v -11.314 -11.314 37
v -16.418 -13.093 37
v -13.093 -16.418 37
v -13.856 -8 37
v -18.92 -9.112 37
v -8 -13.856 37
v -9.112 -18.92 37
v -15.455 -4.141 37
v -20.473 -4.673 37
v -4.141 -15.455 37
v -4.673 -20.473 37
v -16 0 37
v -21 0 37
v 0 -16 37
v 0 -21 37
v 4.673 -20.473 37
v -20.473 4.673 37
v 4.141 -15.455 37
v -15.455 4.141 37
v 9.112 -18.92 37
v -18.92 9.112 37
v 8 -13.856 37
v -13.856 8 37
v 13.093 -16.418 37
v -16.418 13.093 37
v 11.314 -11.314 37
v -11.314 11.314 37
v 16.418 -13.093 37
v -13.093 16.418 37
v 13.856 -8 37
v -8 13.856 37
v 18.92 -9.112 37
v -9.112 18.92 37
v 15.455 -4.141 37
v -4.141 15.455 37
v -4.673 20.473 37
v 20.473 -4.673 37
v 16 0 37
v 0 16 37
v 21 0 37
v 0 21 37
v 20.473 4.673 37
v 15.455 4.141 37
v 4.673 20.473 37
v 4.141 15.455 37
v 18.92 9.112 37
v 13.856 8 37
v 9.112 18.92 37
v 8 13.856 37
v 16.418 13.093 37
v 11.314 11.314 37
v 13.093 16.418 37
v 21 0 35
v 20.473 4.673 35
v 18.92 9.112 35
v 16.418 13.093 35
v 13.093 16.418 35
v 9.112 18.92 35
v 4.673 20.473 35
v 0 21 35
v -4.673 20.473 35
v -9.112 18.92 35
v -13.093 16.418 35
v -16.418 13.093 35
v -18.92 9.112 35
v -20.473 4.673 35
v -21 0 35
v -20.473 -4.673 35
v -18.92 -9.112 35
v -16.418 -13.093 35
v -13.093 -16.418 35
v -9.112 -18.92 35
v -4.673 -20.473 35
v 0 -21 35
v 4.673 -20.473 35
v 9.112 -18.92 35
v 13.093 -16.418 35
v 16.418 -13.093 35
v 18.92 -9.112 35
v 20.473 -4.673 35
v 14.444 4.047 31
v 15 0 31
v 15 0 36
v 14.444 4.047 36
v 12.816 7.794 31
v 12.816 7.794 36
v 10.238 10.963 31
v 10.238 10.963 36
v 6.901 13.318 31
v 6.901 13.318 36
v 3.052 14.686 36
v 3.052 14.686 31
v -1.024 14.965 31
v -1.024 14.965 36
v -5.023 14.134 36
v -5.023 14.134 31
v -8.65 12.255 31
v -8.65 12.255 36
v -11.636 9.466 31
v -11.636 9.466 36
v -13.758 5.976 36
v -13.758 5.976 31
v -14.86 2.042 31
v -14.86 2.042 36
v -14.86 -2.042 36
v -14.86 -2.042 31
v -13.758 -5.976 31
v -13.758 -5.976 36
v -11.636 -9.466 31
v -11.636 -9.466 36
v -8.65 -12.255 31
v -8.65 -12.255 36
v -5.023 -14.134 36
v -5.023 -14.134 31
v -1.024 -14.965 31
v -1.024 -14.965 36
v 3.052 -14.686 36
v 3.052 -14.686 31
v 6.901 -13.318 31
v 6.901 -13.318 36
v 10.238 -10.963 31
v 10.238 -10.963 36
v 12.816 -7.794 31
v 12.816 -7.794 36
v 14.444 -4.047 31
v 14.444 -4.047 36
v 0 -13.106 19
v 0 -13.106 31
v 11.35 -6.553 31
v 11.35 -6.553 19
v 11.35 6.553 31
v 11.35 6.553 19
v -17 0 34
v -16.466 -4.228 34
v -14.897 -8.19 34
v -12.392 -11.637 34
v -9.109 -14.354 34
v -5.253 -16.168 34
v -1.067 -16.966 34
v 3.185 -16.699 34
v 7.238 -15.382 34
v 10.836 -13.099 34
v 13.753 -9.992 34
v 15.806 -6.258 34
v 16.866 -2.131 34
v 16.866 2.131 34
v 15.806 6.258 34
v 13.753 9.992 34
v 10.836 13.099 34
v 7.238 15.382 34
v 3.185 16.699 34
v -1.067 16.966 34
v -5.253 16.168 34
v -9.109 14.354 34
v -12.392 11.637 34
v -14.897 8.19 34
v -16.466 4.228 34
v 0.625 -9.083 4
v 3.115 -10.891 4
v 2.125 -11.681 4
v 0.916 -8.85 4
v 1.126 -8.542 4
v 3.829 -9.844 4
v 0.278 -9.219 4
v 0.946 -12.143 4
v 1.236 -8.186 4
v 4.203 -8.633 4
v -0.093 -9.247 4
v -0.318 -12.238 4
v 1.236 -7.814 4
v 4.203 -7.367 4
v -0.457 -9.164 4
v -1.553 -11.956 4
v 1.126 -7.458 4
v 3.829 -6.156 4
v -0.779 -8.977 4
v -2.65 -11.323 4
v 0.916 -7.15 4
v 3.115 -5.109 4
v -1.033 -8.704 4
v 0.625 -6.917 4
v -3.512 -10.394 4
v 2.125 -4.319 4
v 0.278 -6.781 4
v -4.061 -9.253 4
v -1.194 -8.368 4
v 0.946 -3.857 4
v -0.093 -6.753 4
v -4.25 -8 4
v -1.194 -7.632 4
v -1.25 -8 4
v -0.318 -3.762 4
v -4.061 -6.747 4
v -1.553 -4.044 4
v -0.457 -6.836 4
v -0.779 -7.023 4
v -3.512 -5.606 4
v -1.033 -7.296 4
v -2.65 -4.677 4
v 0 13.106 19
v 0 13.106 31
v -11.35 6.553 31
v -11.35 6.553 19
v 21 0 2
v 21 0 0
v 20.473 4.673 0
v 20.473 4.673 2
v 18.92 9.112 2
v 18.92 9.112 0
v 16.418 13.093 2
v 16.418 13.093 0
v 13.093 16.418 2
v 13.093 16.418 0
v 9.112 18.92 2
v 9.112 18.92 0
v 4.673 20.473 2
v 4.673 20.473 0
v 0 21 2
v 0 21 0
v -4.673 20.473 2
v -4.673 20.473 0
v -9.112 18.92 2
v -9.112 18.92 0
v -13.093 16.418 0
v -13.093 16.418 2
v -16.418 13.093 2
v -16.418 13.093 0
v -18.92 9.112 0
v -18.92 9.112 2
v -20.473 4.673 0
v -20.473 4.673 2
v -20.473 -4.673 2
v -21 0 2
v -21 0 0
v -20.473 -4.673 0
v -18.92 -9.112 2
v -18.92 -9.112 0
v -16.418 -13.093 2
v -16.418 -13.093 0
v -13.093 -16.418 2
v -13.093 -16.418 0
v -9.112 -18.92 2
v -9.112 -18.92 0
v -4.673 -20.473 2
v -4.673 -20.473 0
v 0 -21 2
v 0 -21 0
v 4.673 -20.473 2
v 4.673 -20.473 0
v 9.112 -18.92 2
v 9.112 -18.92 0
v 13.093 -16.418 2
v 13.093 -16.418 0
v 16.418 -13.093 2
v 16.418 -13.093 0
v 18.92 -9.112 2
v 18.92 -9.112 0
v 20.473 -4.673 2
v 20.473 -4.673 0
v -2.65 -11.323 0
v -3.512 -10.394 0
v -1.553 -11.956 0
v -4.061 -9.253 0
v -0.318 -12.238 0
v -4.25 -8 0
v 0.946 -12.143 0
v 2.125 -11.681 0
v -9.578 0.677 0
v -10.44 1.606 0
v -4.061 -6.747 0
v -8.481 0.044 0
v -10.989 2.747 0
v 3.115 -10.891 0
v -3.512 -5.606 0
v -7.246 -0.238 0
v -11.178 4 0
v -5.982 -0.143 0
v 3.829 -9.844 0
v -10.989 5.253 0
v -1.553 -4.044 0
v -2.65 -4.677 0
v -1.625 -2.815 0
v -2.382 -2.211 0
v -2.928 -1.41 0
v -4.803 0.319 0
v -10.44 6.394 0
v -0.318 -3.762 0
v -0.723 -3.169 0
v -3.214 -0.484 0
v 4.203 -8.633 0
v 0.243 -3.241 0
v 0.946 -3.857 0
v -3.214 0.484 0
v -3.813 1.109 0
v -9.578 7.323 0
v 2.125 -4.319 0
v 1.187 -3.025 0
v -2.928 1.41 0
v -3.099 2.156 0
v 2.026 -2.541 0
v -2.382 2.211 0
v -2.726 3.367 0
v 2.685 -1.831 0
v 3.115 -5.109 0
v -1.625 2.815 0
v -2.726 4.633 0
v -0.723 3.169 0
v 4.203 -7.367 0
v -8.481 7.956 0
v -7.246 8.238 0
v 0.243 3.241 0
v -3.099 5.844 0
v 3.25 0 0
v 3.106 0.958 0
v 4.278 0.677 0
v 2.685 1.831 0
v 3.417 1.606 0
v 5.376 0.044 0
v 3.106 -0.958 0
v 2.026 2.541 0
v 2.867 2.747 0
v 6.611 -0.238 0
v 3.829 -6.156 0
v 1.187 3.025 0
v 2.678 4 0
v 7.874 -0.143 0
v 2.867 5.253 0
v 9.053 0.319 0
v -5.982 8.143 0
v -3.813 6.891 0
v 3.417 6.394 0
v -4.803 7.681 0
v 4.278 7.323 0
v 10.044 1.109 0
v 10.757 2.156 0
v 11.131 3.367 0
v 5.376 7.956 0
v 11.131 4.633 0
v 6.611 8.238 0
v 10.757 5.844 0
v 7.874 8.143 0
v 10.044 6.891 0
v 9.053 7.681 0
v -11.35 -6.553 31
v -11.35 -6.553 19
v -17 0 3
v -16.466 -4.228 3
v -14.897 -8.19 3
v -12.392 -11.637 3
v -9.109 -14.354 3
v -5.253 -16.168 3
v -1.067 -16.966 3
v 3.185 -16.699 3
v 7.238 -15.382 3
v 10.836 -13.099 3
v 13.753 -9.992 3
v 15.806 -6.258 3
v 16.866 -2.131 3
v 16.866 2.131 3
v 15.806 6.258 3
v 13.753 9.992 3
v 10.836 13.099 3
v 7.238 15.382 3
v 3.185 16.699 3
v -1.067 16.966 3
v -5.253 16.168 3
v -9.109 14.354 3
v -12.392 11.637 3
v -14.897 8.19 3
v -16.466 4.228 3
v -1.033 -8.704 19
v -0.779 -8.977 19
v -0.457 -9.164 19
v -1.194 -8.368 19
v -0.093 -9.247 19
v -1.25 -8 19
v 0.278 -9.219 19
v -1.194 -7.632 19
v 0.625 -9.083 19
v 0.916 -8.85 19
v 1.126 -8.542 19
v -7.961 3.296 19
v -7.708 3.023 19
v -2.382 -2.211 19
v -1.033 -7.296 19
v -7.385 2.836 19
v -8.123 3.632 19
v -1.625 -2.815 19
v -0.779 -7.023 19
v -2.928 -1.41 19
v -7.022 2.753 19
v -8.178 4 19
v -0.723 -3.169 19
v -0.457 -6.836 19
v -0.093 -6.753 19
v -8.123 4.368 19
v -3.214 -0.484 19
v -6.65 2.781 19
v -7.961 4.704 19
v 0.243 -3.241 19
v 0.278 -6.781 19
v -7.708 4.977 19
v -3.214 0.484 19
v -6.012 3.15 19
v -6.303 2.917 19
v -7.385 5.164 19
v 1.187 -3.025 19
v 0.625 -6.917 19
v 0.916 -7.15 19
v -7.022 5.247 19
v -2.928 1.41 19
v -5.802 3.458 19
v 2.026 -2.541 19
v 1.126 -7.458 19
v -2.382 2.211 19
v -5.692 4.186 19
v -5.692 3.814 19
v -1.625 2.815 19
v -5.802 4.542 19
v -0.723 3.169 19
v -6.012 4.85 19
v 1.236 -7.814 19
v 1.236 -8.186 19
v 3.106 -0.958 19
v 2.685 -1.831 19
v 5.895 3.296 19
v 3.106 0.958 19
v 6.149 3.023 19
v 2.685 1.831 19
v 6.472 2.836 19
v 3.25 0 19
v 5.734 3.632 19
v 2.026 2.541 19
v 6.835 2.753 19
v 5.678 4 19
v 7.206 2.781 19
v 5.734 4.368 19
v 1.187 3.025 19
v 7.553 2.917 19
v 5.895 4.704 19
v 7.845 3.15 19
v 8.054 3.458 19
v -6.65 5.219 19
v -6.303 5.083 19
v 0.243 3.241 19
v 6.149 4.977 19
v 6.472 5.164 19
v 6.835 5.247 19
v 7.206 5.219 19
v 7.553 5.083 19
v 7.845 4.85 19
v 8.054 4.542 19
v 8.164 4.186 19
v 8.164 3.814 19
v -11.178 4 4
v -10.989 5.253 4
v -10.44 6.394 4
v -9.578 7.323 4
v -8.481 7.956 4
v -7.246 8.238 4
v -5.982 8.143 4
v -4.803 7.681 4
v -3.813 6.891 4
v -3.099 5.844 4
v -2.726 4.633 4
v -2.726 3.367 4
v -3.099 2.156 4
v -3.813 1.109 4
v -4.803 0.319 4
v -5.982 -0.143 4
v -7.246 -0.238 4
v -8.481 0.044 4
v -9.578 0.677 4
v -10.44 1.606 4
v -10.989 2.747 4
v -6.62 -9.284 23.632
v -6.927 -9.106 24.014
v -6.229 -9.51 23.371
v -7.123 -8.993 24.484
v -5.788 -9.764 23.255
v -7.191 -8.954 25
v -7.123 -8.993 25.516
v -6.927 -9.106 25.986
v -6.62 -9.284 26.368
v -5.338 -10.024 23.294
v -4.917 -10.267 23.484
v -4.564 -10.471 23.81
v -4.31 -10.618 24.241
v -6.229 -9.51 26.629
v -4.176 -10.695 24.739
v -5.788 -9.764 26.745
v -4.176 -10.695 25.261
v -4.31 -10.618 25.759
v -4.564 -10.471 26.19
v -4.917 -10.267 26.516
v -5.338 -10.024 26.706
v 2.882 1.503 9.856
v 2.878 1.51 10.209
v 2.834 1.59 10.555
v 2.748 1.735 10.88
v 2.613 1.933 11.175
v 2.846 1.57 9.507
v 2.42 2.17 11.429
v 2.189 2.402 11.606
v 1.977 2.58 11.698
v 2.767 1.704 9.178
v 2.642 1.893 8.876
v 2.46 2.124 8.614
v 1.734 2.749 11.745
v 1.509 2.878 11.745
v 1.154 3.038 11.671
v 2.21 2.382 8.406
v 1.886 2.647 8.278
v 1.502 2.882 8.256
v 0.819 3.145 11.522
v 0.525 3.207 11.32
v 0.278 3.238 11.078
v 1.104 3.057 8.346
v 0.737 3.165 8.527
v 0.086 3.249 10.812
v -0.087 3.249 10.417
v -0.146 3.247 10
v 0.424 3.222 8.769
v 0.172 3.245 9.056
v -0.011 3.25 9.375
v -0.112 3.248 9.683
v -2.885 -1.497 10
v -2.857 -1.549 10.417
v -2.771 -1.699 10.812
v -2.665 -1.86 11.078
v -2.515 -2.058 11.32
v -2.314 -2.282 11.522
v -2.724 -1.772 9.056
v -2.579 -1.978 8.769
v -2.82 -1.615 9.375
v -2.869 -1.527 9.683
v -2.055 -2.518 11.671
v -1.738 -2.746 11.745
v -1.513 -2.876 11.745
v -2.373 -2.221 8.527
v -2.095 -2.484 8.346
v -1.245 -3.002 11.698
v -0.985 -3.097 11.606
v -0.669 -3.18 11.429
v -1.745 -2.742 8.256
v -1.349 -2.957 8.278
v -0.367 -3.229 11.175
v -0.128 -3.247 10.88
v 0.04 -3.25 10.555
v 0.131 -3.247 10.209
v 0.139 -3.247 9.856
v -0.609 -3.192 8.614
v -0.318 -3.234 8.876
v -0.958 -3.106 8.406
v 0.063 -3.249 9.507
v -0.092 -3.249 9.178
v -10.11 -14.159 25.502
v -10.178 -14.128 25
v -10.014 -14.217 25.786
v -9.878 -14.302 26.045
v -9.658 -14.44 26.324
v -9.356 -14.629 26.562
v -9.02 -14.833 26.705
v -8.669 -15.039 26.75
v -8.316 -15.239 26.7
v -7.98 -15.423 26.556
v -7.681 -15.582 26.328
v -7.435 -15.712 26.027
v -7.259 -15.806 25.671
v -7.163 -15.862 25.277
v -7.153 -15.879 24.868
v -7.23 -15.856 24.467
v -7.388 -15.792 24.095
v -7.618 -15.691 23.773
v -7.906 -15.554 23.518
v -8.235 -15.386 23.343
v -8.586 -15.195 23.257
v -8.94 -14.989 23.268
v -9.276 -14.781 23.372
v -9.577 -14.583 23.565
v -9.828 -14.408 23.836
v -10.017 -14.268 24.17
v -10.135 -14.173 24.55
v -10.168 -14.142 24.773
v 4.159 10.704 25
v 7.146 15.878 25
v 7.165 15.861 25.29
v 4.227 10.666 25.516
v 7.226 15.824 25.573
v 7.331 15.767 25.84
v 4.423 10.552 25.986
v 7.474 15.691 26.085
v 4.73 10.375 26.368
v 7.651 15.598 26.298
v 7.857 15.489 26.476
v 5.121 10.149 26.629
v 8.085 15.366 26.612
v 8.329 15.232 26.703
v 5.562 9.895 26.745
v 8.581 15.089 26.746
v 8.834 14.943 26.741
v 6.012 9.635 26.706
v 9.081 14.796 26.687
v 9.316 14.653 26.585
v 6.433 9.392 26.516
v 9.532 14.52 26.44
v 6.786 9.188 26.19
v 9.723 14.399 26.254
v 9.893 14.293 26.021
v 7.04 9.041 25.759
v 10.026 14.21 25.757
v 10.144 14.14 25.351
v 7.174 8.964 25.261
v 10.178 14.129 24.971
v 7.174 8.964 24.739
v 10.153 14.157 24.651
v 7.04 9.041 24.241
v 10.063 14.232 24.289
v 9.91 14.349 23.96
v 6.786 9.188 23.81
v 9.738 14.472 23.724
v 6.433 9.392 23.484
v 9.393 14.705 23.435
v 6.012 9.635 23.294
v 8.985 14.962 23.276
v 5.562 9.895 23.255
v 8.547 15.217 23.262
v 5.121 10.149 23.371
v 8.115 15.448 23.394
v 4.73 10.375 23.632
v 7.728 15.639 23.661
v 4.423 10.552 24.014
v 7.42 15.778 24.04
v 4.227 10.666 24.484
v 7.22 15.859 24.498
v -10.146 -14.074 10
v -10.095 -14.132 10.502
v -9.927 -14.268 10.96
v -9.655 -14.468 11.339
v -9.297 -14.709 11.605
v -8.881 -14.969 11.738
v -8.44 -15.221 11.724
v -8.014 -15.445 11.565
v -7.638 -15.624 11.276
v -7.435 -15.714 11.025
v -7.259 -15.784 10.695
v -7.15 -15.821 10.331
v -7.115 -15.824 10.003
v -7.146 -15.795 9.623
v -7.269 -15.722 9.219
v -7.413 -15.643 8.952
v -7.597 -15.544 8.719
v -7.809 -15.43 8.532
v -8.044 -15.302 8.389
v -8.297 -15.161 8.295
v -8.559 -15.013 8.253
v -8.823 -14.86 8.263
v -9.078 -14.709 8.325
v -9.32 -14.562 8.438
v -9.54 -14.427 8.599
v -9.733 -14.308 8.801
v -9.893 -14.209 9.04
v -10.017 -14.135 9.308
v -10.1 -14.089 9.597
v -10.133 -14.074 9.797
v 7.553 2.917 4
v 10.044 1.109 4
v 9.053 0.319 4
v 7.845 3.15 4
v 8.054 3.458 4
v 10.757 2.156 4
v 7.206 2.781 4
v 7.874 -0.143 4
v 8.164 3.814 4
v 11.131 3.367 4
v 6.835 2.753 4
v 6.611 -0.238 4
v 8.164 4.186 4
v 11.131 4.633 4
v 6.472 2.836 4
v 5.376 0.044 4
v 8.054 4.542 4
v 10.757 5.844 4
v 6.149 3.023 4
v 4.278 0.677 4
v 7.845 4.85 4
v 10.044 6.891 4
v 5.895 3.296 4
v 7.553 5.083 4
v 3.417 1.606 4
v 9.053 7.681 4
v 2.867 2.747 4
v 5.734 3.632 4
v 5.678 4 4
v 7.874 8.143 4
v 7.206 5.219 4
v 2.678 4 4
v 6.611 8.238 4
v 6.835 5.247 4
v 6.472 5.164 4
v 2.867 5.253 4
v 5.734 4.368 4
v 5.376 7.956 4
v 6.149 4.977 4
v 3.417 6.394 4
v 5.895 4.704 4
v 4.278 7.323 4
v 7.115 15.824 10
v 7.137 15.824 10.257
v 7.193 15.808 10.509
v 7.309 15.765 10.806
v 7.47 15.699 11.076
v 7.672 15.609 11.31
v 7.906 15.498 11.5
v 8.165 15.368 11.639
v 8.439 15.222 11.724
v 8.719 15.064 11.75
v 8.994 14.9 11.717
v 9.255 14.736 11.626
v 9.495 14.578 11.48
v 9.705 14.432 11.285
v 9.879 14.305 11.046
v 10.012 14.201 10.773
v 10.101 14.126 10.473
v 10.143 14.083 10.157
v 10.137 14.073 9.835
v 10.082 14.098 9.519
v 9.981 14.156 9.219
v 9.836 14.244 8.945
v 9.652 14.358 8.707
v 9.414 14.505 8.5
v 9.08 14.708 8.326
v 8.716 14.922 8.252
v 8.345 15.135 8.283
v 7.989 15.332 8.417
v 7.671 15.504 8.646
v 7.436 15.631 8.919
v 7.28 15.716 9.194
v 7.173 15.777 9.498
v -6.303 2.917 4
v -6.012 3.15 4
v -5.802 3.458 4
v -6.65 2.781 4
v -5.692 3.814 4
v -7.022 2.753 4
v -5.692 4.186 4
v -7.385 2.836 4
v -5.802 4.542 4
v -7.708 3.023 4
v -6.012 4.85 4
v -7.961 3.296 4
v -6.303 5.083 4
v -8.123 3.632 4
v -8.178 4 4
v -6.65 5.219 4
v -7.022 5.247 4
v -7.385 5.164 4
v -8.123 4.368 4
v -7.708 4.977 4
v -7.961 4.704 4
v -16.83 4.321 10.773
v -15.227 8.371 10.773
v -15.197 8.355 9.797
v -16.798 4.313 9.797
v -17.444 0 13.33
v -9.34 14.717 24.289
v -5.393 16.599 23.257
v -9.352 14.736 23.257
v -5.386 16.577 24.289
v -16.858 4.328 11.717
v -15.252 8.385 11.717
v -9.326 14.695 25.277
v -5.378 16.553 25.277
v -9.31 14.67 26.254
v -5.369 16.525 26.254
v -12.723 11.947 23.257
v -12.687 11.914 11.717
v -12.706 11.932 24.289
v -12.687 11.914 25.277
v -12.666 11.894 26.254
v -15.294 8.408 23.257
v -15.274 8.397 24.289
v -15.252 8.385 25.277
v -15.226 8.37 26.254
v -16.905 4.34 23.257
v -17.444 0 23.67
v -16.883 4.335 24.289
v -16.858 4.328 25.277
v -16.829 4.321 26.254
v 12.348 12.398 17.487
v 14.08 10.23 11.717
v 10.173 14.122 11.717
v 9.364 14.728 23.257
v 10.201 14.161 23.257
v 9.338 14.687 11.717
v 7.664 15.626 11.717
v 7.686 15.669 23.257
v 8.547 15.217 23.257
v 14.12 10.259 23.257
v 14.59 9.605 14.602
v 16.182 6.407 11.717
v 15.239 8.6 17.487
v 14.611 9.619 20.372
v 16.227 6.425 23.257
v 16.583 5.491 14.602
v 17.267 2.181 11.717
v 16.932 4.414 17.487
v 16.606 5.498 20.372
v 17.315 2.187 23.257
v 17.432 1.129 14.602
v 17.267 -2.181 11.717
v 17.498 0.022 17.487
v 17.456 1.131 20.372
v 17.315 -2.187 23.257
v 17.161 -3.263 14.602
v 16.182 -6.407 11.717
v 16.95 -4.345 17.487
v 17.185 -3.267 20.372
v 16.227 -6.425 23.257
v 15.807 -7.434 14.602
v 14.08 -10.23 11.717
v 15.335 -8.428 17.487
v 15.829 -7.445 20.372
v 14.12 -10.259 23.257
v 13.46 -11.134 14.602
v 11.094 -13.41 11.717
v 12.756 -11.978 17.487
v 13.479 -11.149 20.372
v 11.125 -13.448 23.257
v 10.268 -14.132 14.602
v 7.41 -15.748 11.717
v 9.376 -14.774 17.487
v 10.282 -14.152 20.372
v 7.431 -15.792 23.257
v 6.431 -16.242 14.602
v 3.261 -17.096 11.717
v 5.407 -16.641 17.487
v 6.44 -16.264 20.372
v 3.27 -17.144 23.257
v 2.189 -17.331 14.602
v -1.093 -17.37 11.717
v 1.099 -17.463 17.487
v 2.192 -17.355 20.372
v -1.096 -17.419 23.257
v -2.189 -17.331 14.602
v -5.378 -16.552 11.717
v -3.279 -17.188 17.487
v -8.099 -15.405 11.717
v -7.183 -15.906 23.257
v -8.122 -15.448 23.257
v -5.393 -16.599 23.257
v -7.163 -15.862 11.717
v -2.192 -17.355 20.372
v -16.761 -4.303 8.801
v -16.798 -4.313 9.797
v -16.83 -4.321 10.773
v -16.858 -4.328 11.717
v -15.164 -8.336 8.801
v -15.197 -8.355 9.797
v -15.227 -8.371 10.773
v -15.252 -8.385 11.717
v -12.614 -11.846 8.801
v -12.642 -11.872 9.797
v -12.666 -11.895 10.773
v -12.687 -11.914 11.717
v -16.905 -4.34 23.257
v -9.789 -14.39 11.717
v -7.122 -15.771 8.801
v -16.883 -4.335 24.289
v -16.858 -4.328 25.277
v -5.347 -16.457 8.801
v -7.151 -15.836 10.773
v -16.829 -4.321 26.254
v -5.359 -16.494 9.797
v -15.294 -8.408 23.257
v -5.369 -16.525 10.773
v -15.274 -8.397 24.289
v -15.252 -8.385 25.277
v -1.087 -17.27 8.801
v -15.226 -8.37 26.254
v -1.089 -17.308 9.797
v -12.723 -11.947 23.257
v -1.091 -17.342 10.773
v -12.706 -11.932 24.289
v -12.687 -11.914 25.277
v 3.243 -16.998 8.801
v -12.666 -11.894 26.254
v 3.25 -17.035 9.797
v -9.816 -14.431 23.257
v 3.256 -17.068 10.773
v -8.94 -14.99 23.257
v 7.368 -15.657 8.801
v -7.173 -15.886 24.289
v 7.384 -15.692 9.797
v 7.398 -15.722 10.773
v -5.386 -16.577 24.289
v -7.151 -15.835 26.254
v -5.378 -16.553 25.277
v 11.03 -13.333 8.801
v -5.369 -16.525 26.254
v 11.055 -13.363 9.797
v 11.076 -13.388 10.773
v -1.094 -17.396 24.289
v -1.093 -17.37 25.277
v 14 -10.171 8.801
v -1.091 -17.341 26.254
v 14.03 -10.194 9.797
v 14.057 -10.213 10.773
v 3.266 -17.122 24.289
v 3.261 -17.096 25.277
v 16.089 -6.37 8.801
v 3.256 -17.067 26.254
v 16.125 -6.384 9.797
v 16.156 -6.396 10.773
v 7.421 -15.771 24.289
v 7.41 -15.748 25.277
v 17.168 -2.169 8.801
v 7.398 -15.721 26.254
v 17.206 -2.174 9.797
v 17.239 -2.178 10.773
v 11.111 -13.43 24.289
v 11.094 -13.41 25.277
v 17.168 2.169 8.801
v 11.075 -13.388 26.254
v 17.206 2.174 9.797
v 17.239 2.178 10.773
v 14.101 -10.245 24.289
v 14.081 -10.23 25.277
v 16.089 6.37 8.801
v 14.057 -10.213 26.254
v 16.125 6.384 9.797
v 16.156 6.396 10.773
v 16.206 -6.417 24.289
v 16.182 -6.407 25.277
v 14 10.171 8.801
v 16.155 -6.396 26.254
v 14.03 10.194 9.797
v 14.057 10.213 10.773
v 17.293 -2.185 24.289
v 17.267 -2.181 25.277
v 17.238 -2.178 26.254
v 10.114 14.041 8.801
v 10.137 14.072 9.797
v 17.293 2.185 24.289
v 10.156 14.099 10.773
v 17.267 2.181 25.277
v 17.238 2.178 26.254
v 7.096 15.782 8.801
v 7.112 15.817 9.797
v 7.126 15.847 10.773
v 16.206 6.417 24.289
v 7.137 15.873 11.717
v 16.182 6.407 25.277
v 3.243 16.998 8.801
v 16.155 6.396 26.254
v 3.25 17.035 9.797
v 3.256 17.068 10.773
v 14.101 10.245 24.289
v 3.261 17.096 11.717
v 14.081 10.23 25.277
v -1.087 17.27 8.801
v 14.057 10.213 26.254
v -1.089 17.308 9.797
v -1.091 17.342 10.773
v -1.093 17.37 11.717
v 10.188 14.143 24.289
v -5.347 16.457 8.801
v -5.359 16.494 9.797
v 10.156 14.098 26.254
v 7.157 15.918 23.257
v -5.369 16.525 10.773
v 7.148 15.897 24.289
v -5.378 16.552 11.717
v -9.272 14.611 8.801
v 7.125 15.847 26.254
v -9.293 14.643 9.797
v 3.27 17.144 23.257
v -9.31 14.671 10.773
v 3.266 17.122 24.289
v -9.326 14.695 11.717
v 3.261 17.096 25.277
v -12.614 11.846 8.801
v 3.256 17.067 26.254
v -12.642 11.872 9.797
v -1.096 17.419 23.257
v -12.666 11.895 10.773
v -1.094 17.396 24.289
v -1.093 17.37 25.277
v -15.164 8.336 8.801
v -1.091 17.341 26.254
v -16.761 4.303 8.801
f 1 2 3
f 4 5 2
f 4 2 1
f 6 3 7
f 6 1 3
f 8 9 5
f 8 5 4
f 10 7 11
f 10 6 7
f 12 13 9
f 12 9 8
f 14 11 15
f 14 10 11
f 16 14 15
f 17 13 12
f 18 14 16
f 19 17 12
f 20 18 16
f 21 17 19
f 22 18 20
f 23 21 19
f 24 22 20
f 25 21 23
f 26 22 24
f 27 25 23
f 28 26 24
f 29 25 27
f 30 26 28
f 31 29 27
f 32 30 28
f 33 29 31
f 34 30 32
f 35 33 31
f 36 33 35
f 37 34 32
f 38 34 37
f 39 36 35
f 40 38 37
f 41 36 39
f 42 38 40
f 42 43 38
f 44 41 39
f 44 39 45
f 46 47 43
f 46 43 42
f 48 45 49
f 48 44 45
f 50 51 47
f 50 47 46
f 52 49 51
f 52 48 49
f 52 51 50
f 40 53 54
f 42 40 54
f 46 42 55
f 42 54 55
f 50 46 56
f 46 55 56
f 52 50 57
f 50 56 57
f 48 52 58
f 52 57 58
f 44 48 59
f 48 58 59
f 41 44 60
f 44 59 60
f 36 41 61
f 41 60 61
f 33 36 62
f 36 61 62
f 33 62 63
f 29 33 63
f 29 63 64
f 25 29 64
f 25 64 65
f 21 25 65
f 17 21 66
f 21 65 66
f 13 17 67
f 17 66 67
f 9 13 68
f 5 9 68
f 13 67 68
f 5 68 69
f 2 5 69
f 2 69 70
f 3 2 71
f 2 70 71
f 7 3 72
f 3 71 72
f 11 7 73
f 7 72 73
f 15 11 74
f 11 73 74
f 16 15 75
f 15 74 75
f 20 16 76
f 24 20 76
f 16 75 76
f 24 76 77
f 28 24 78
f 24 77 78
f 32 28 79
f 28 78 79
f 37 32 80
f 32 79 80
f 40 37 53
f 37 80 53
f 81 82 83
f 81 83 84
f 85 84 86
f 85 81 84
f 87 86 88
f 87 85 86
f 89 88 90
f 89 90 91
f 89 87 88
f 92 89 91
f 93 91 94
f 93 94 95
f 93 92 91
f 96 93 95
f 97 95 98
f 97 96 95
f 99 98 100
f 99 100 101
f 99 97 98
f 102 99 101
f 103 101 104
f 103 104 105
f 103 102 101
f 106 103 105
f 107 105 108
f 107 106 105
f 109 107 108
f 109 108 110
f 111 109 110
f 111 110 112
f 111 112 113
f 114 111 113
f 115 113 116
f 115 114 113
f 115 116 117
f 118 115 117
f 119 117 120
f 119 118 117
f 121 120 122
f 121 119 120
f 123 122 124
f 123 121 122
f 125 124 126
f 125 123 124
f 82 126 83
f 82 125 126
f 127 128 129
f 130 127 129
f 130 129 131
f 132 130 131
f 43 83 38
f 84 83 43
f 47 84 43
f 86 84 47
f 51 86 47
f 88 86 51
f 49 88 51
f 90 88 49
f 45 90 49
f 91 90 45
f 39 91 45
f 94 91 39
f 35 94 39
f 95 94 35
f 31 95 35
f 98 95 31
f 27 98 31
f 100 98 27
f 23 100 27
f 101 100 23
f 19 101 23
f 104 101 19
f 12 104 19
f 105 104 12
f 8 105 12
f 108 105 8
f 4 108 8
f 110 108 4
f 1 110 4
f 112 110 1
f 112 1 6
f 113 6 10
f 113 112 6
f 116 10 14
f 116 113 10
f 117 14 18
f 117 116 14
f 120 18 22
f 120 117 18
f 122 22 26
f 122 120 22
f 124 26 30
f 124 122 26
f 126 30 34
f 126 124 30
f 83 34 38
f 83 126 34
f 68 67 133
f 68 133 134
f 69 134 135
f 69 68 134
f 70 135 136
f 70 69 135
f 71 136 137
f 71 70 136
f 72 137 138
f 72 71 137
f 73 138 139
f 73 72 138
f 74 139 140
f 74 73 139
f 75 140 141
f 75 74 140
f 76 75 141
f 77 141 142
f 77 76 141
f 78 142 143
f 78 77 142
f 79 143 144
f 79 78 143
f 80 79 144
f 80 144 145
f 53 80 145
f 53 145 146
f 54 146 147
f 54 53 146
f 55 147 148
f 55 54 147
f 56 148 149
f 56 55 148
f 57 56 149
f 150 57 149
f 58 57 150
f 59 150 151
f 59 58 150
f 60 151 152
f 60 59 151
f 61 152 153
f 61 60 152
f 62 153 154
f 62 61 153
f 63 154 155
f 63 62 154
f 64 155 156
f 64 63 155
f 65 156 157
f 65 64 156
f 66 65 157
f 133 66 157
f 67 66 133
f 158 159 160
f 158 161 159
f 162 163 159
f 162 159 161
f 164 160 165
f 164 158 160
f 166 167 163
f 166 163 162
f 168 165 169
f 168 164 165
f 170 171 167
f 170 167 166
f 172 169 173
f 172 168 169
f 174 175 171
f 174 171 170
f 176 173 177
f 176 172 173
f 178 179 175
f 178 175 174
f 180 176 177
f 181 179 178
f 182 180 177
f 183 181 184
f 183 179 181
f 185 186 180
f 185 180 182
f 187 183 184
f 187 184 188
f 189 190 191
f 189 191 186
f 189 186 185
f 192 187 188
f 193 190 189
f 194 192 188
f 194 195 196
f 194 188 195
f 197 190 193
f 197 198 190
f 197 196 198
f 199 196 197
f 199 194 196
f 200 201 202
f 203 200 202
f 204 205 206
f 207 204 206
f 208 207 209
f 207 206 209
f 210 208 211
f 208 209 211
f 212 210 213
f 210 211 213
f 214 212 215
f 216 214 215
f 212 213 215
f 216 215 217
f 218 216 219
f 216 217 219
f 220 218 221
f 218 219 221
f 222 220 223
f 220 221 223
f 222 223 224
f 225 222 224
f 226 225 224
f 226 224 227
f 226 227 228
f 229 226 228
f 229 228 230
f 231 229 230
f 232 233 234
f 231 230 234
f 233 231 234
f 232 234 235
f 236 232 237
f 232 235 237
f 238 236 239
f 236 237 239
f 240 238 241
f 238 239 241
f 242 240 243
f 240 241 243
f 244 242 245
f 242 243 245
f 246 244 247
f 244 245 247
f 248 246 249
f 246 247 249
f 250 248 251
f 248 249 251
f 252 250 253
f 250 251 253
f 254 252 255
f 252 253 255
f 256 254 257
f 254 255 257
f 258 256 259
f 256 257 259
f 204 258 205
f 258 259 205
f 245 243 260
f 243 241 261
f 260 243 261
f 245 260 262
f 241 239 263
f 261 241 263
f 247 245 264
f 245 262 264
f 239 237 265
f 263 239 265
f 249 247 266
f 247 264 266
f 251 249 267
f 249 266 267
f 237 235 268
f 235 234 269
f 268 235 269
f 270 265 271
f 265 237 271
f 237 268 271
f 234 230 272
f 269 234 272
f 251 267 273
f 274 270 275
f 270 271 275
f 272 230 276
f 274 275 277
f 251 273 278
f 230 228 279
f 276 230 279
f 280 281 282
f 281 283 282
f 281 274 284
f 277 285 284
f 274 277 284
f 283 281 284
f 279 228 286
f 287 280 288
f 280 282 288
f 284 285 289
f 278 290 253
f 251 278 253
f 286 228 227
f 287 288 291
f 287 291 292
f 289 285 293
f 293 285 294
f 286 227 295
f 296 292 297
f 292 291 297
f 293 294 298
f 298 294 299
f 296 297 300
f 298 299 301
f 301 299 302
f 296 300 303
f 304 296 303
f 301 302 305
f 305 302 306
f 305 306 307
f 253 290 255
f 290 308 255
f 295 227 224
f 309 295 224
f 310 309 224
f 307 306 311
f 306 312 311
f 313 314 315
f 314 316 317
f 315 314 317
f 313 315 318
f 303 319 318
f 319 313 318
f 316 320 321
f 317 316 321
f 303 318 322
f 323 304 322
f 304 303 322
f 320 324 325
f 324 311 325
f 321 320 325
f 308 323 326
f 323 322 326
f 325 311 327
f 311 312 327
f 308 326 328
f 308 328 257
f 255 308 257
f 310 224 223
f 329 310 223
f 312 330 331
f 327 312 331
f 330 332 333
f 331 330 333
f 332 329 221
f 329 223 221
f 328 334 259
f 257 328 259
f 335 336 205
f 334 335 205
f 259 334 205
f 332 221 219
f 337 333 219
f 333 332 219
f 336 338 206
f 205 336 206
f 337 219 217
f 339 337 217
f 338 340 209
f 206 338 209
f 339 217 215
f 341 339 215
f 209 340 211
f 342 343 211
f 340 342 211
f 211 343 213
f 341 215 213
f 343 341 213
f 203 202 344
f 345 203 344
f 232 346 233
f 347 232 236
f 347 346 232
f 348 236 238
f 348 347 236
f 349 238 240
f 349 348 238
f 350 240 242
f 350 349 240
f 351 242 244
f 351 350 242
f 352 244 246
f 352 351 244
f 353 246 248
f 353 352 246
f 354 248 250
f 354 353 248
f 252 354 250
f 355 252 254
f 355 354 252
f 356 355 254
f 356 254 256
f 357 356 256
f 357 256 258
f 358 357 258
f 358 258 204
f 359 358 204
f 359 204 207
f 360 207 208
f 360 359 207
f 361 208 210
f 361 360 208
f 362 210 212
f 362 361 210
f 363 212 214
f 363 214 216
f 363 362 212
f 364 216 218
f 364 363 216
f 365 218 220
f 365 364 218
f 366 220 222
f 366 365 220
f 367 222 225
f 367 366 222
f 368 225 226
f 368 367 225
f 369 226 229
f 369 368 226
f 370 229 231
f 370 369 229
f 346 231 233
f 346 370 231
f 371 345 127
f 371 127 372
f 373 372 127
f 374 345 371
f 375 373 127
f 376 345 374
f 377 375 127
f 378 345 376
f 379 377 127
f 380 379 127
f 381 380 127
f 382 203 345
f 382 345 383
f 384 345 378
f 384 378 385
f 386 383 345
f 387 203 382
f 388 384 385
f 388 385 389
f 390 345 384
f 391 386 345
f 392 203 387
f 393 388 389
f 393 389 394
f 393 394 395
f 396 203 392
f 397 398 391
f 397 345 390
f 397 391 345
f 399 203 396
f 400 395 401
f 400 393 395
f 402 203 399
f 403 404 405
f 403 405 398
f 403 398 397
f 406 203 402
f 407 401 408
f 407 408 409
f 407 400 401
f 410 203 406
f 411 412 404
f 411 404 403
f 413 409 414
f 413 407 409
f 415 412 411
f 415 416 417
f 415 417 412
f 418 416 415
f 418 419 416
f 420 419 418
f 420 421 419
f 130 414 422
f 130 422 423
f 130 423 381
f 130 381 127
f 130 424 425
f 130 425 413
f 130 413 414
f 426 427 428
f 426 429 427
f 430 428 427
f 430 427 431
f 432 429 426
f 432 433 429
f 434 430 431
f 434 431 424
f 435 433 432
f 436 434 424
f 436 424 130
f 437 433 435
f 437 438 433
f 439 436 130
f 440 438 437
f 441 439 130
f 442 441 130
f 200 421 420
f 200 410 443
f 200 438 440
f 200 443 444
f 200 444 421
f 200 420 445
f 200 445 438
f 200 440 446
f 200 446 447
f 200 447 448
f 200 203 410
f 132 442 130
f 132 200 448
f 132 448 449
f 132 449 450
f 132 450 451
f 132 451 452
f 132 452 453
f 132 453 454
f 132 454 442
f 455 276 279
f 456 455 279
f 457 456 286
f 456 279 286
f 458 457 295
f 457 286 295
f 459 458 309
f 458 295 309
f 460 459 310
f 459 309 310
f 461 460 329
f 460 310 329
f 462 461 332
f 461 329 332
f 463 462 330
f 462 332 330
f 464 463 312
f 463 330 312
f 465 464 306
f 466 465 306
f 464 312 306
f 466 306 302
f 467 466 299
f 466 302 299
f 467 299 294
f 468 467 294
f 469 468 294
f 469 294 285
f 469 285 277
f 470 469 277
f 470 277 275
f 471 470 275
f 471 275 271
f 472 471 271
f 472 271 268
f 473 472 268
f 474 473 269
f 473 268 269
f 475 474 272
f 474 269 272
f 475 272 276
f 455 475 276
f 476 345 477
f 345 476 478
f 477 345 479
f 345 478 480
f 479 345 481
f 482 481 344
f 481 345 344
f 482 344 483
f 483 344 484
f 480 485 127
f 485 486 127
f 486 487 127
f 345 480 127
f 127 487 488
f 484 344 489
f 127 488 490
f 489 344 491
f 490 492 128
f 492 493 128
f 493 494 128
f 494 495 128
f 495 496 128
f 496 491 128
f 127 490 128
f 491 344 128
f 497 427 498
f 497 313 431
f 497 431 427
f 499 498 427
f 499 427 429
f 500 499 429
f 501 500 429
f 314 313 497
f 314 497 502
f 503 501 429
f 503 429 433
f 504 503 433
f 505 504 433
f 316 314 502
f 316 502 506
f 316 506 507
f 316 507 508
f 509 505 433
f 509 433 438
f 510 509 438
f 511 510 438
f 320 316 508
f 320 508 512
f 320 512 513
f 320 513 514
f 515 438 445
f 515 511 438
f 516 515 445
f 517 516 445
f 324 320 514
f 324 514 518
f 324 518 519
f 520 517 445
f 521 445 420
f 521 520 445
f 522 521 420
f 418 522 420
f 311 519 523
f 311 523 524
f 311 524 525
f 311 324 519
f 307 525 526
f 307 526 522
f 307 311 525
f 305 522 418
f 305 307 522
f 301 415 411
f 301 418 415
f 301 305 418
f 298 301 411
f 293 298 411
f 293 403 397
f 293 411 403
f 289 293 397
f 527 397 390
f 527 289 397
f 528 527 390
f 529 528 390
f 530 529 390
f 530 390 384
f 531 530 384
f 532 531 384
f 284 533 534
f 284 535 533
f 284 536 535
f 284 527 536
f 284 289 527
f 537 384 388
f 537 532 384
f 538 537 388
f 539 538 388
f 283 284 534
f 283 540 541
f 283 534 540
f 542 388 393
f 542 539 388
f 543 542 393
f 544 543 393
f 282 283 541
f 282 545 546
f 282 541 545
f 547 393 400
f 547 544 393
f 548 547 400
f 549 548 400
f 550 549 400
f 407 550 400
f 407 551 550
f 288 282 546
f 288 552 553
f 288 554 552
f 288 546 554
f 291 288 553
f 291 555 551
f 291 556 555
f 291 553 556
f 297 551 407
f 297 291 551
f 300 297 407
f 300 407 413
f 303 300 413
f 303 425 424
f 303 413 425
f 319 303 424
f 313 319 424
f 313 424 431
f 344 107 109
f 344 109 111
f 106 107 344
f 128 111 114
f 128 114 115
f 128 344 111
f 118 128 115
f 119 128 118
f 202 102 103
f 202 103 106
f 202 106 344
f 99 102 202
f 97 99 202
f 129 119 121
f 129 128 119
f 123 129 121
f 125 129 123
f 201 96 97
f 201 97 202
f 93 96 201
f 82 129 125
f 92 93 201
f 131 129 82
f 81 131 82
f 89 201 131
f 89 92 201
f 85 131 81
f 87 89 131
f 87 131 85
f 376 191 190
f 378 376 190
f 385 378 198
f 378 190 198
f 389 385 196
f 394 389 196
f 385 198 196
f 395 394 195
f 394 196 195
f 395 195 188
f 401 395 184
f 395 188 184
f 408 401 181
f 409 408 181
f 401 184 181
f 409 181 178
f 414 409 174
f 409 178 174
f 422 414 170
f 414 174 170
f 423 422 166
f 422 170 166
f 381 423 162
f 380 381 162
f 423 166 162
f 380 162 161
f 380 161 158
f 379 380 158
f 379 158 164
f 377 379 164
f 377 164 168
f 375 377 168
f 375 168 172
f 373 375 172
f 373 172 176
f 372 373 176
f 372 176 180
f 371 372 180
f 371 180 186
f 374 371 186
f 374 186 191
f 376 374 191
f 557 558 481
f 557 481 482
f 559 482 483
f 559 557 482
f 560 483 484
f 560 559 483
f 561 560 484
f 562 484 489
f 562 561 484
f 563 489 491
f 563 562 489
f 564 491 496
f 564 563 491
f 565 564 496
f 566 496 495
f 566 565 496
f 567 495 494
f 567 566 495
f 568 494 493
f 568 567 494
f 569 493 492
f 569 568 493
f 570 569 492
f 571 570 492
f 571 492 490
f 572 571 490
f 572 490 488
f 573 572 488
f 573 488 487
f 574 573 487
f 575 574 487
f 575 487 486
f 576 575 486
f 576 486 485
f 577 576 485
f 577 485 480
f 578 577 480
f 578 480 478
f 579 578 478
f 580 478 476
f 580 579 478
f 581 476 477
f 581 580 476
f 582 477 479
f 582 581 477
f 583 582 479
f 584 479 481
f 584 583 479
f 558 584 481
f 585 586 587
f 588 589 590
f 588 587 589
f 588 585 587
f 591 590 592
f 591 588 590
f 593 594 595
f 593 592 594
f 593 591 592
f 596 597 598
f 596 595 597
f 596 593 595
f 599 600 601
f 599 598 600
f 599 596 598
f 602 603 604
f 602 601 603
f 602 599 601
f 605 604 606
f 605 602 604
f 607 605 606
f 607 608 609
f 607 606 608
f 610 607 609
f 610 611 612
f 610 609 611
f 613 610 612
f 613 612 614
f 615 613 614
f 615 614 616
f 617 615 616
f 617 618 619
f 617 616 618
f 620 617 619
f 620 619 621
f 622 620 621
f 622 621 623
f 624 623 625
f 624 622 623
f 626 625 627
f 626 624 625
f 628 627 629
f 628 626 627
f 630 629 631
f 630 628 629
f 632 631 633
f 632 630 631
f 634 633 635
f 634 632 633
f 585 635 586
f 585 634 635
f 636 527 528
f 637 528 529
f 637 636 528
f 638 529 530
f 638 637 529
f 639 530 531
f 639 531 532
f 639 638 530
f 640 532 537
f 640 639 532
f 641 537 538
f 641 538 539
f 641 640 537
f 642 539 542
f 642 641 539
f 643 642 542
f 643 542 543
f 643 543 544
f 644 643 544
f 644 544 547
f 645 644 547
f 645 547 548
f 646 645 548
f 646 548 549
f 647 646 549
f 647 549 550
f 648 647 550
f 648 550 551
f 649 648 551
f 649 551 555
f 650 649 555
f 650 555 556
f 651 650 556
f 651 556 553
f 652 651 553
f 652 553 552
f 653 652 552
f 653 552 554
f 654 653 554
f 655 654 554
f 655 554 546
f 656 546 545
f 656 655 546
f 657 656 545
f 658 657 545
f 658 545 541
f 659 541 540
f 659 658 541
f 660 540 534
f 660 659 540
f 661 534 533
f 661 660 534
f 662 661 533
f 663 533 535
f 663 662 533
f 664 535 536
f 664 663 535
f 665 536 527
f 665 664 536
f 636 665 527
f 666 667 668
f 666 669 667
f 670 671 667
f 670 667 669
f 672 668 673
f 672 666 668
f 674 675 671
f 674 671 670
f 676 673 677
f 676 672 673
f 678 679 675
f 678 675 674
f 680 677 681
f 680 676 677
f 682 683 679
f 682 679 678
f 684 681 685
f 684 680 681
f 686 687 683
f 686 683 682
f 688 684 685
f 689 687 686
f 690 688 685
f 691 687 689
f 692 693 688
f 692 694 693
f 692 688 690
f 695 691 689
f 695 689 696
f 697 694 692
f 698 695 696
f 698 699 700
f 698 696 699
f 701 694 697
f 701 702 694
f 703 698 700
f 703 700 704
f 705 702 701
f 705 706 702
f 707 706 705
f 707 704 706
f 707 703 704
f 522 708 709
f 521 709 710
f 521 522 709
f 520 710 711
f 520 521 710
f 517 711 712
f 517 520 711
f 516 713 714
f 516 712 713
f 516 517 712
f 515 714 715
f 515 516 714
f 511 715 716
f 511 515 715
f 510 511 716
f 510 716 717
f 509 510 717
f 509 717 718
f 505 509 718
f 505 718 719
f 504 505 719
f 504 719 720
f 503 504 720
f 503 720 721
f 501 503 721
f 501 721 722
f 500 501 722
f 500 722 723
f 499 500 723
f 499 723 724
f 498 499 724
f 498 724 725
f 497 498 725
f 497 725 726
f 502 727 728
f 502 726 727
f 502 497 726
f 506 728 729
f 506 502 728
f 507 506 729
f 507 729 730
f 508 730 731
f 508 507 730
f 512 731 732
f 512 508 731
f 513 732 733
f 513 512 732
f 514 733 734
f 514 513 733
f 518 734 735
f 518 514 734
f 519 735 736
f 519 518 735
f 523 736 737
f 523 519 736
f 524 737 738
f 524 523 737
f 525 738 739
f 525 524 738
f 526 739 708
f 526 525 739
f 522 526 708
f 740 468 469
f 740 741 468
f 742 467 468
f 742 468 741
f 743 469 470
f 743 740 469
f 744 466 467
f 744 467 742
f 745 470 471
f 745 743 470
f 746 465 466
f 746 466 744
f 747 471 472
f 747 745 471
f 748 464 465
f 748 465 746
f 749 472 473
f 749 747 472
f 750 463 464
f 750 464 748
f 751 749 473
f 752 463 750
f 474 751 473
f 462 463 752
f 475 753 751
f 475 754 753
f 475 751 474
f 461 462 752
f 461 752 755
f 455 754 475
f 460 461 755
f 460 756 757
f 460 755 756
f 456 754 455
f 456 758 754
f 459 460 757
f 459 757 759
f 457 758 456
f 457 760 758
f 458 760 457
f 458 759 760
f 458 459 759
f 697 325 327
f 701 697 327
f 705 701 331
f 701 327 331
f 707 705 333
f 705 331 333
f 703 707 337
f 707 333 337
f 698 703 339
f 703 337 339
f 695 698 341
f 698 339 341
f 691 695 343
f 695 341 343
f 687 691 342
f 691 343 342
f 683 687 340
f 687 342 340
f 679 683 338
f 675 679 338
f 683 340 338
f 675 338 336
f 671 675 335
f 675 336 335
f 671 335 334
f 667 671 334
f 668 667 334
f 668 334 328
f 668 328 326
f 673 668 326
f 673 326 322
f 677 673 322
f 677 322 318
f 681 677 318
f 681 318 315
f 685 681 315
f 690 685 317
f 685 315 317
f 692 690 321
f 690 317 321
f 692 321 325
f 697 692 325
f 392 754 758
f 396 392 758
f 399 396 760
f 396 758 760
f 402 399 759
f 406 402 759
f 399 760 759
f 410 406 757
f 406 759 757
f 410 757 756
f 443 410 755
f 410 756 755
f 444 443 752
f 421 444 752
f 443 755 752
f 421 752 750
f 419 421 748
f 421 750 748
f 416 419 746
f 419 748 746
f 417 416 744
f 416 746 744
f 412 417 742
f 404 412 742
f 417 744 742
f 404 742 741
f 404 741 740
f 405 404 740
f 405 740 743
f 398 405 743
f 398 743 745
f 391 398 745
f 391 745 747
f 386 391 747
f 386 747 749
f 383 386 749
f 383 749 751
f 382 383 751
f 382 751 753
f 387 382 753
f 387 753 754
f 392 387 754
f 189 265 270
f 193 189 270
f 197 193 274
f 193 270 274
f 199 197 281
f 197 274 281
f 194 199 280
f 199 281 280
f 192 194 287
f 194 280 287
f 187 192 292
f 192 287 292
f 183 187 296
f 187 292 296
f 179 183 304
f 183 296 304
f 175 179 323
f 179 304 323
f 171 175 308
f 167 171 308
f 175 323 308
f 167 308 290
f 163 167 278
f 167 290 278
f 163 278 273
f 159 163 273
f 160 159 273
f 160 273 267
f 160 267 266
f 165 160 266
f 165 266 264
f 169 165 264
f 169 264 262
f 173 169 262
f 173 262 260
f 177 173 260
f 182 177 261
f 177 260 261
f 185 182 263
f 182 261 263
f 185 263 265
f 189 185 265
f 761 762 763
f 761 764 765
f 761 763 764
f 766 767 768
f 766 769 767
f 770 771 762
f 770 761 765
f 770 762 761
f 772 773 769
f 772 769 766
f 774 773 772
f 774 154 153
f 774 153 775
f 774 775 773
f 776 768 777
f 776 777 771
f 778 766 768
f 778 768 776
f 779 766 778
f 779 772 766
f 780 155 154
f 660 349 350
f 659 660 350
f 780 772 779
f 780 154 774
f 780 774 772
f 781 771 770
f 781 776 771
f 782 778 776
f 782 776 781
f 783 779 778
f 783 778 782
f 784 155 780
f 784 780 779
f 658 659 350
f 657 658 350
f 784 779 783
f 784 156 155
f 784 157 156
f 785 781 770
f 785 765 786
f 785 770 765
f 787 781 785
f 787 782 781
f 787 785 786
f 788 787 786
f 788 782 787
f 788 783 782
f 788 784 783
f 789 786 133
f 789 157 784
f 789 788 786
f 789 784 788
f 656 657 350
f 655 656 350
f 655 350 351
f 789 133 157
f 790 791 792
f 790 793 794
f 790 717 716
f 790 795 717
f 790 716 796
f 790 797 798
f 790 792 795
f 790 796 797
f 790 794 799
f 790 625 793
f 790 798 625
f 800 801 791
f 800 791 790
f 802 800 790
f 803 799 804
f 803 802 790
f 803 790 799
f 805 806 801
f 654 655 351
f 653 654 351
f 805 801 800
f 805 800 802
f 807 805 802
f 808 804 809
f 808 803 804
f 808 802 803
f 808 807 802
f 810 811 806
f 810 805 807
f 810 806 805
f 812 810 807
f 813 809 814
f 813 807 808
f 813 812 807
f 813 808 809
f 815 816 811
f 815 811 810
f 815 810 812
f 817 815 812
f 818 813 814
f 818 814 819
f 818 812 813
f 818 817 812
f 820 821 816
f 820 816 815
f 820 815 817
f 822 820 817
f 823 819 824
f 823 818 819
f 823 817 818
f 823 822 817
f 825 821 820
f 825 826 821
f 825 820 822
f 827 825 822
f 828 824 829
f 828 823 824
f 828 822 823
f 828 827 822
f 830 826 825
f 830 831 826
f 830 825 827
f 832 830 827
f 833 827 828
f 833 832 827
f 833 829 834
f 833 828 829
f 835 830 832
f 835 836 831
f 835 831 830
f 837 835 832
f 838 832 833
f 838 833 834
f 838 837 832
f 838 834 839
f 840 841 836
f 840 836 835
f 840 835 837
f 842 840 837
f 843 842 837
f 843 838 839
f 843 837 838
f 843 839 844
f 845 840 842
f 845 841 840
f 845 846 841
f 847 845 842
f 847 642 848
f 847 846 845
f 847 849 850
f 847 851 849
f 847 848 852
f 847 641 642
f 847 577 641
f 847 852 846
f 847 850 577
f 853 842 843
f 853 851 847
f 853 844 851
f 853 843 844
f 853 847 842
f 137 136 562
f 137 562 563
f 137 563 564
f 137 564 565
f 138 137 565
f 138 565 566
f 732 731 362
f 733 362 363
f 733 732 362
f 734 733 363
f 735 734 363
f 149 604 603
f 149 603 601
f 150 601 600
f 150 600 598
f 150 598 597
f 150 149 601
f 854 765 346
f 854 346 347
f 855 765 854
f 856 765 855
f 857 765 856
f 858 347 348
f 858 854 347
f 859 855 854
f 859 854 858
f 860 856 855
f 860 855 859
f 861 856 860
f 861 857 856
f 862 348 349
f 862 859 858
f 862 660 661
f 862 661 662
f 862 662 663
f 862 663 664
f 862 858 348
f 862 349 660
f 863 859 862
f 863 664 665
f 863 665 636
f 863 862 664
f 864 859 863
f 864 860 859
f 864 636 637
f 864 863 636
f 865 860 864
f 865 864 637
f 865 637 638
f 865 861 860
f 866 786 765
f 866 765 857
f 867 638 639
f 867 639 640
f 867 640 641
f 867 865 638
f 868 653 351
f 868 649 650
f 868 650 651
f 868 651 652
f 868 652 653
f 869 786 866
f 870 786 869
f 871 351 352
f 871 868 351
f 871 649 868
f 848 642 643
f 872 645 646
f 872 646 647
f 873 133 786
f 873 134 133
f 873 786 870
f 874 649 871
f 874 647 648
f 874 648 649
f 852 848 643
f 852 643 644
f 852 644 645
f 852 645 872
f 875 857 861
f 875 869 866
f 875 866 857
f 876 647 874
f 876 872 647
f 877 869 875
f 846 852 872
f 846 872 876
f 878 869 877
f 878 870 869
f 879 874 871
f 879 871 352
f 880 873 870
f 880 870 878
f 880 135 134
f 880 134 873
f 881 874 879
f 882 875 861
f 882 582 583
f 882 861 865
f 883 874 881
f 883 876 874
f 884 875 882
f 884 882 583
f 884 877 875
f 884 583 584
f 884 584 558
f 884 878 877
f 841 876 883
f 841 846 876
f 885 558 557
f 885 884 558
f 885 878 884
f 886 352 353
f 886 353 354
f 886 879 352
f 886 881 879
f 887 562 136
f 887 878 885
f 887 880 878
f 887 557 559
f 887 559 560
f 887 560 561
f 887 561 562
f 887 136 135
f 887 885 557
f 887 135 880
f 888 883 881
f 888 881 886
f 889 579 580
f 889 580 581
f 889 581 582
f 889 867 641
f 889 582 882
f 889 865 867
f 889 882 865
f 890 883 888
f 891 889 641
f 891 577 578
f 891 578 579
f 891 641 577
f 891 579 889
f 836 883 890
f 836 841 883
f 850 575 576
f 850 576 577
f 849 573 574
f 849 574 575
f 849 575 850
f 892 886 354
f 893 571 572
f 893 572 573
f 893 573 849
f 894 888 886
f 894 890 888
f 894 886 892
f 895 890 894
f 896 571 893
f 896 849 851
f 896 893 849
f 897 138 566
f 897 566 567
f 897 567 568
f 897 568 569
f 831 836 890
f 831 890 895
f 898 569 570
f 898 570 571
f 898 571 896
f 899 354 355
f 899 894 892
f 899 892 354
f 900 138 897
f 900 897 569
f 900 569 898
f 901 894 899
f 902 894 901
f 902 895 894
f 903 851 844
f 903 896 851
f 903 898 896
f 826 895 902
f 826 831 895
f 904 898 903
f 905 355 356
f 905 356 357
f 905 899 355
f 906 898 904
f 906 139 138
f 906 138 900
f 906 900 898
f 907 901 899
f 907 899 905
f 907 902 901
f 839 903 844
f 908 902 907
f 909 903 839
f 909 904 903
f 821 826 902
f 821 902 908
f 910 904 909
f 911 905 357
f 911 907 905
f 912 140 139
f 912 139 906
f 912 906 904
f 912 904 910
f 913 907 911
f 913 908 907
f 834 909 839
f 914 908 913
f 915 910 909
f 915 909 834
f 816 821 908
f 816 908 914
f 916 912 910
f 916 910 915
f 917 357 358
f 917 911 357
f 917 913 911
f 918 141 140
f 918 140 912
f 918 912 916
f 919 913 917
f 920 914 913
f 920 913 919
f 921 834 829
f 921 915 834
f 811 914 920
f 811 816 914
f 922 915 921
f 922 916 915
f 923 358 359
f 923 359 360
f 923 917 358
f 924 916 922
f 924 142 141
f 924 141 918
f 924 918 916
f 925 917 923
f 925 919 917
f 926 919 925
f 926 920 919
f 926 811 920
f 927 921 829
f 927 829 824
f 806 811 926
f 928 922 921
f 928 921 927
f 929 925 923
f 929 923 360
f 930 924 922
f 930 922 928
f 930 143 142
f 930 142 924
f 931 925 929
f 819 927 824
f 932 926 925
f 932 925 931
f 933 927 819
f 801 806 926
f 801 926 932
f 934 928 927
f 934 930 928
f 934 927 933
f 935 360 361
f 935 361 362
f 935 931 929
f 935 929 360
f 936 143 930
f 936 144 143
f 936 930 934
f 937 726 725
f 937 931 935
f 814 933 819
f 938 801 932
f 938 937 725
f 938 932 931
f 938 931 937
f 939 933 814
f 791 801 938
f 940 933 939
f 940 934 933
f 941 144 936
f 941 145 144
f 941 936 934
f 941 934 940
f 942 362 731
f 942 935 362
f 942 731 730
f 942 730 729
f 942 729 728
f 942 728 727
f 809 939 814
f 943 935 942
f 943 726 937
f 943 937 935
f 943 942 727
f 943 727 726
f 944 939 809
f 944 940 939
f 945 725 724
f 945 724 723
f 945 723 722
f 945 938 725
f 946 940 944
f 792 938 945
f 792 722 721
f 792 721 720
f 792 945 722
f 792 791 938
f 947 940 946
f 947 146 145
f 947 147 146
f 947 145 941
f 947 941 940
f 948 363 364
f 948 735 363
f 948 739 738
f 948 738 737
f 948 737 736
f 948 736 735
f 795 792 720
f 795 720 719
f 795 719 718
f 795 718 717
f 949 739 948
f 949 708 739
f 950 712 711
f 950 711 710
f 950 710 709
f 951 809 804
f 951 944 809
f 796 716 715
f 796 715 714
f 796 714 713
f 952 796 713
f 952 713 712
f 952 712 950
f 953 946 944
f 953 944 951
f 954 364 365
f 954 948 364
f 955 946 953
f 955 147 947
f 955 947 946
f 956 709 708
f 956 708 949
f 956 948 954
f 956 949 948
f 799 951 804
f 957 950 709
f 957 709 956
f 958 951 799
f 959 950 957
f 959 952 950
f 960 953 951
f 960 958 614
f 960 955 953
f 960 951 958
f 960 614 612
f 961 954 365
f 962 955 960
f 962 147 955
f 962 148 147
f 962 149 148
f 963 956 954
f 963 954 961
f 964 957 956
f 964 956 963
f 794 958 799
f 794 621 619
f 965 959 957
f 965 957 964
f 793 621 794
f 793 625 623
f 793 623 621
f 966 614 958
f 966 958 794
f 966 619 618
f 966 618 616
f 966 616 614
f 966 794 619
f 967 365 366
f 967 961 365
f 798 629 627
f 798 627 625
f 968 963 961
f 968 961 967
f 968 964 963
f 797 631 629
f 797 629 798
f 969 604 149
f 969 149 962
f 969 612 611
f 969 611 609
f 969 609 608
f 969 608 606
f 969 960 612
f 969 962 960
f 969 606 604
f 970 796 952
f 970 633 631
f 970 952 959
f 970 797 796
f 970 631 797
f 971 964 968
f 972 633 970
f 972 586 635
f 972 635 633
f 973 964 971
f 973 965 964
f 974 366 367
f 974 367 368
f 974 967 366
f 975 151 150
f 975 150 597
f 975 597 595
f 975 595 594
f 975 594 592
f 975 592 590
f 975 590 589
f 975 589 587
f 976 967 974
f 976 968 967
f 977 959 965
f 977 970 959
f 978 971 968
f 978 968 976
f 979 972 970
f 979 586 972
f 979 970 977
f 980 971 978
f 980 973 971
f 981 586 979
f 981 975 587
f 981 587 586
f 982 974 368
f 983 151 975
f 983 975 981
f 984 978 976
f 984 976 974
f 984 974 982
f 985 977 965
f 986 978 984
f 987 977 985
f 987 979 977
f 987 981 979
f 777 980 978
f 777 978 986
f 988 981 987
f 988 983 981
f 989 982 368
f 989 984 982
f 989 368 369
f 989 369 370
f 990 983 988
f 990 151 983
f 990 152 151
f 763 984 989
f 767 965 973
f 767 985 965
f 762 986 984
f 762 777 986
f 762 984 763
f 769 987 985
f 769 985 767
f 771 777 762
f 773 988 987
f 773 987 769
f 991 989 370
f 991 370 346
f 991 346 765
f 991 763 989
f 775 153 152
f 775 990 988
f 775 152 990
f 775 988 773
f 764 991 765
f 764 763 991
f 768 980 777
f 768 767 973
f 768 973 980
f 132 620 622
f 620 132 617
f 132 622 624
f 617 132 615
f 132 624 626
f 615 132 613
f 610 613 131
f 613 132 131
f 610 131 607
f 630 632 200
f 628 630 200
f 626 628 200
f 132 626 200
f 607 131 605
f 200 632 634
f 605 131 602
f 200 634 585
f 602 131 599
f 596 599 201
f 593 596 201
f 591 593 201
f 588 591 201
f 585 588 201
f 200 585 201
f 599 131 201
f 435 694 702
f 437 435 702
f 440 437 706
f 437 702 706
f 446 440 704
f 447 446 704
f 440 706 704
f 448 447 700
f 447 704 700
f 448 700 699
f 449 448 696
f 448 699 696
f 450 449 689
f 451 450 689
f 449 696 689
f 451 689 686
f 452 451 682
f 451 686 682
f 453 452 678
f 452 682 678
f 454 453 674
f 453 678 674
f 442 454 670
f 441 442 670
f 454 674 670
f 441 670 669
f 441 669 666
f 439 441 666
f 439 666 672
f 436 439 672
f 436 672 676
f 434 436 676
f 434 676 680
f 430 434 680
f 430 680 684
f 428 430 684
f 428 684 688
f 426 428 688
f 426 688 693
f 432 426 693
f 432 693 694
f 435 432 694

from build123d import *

# Parameters (mm, degrees)
ESQUISSE1_R                   = 21
ESQUISSE1_R_2                 = 3.25
BOSS_EXTRU_1_DEPTH            = 31
ESQUISSE2_R                   = 21
ESQUISSE2_R_2                 = 15
BOSS_EXTRU_2_DEPTH            = 6
ENL_V_MAT_EXTRU_9_DEPTH       = 12
CHANFREIN1_SIZE               = 1
ESQUISSE11_R                  = 1.25
ENL_V_MAT_EXTRU_10_DEPTH      = 48.444704657
ESQUISSE12_R                  = 4.25
ENL_V_MAT_EXTRU_11_DEPTH      = 4
ENL_V_MAT_EXTRU_12_DEPTH      = 56.054580282
ENL_V_MAT_EXTRU_12_DEPTH_BACK = 56.054580282
ESQUISSE13_R                  = 1.75


with BuildPart() as part:
    # Esquisse1 → Boss.-Extru.1 (new body)
    with BuildSketch(Plane.XY):
        Circle(ESQUISSE1_R)
        Circle(ESQUISSE1_R_2, mode=Mode.SUBTRACT)
    extrude(amount=BOSS_EXTRU_1_DEPTH)

    # Esquisse2 → Boss.-Extru.2 (add)
    with BuildSketch(Plane.XY.offset(31)):
        Circle(ESQUISSE2_R)
        Circle(ESQUISSE2_R_2, mode=Mode.SUBTRACT)
    extrude(amount=BOSS_EXTRU_2_DEPTH)

    # Esquisse9 → Enlèv. mat.-Extru.9 (cut)
    with BuildSketch(Plane.XY.offset(31)):
        Polygon((11.35, -6.552925555), (11.35, 6.552925555), (0, 13.105851111), (-11.35, 6.552925555), (-11.35, -6.552925555), (0, -13.105851111), align=None)
    extrude(amount=-ENL_V_MAT_EXTRU_9_DEPTH, mode=Mode.SUBTRACT)

    # Chanfrein1
    chanfrein1_edges = [part.edges().sort_by_distance(p)[0] for p in [
        (-15, 0, 37),
    ]]
    chamfer(chanfrein1_edges, length=CHANFREIN1_SIZE)

    # Esquisse10 → Enlèvement de matière-Révolution1 (revolve, cut)
    with BuildSketch(Plane(origin=(0, 0, 0), x_dir=(0, 0, -1), z_dir=(1, 0, 0)), mode=Mode.PRIVATE) as enl_vement_de_mati_re_r_volution1_sk:
        with BuildLine():
            Line((-35, 21), (-2, 21))
            Line((-2, 21), (-3, 17))
            ThreePointArc((-3, 17), (-18.5, 17.5), (-34, 17))
            Line((-34, 17), (-35, 21))
        make_face()
    revolve(enl_vement_de_mati_re_r_volution1_sk.sketch.rotate(Axis((0, 0, 0), (0, 0, 1)), 90), axis=Axis((0, 0, 0), (0, 0, 1)), mode=Mode.SUBTRACT)

    # Esquisse11 → Enlèv. mat.-Extru.10 (cut, through all)
    with BuildSketch(Plane(origin=(0, 0, 0), x_dir=(-1, 0, 0), z_dir=(0, 0, -1))):
        with Locations((-6.92820323, 4)):
            Circle(ESQUISSE11_R)
        with Locations((6.92820323, 4)):
            Circle(ESQUISSE11_R)
        with Locations((0, -8)):
            Circle(ESQUISSE11_R)
    extrude(amount=-ENL_V_MAT_EXTRU_10_DEPTH, mode=Mode.SUBTRACT)

    # Esquisse12 → Enlèv. mat.-Extru.11 (cut)
    with BuildSketch(Plane(origin=(0, 0, 0), x_dir=(-1, 0, 0), z_dir=(0, 0, -1))):
        with Locations((-6.92820323, 4)):
            Circle(ESQUISSE12_R)
        with Locations((6.92820323, 4)):
            Circle(ESQUISSE12_R)
        with Locations((0, -8)):
            Circle(ESQUISSE12_R)
    extrude(amount=-ENL_V_MAT_EXTRU_11_DEPTH, mode=Mode.SUBTRACT)

    # Esquisse13 → Enlèv. mat.-Extru.12 (cut, two sides: drawn at the far end of the back side and taken through both)
    with BuildSketch(Plane(origin=(-5.675, -9.829388333, 0), x_dir=(0.8660254037844387, -0.49999999999999983, 0), z_dir=(0.49999999999999983, 0.8660254037844387, 0)).offset(-ENL_V_MAT_EXTRU_12_DEPTH_BACK)):
        with Locations(Location((0, -25, 0), (0, 0, 180))):
            Circle(ESQUISSE13_R)
        with Locations(Location((0, -10, 0), (0, 0, 180))):
            Circle(ESQUISSE13_R)
    extrude(amount=ENL_V_MAT_EXTRU_12_DEPTH + ENL_V_MAT_EXTRU_12_DEPTH_BACK, mode=Mode.SUBTRACT)


solid = part.part
